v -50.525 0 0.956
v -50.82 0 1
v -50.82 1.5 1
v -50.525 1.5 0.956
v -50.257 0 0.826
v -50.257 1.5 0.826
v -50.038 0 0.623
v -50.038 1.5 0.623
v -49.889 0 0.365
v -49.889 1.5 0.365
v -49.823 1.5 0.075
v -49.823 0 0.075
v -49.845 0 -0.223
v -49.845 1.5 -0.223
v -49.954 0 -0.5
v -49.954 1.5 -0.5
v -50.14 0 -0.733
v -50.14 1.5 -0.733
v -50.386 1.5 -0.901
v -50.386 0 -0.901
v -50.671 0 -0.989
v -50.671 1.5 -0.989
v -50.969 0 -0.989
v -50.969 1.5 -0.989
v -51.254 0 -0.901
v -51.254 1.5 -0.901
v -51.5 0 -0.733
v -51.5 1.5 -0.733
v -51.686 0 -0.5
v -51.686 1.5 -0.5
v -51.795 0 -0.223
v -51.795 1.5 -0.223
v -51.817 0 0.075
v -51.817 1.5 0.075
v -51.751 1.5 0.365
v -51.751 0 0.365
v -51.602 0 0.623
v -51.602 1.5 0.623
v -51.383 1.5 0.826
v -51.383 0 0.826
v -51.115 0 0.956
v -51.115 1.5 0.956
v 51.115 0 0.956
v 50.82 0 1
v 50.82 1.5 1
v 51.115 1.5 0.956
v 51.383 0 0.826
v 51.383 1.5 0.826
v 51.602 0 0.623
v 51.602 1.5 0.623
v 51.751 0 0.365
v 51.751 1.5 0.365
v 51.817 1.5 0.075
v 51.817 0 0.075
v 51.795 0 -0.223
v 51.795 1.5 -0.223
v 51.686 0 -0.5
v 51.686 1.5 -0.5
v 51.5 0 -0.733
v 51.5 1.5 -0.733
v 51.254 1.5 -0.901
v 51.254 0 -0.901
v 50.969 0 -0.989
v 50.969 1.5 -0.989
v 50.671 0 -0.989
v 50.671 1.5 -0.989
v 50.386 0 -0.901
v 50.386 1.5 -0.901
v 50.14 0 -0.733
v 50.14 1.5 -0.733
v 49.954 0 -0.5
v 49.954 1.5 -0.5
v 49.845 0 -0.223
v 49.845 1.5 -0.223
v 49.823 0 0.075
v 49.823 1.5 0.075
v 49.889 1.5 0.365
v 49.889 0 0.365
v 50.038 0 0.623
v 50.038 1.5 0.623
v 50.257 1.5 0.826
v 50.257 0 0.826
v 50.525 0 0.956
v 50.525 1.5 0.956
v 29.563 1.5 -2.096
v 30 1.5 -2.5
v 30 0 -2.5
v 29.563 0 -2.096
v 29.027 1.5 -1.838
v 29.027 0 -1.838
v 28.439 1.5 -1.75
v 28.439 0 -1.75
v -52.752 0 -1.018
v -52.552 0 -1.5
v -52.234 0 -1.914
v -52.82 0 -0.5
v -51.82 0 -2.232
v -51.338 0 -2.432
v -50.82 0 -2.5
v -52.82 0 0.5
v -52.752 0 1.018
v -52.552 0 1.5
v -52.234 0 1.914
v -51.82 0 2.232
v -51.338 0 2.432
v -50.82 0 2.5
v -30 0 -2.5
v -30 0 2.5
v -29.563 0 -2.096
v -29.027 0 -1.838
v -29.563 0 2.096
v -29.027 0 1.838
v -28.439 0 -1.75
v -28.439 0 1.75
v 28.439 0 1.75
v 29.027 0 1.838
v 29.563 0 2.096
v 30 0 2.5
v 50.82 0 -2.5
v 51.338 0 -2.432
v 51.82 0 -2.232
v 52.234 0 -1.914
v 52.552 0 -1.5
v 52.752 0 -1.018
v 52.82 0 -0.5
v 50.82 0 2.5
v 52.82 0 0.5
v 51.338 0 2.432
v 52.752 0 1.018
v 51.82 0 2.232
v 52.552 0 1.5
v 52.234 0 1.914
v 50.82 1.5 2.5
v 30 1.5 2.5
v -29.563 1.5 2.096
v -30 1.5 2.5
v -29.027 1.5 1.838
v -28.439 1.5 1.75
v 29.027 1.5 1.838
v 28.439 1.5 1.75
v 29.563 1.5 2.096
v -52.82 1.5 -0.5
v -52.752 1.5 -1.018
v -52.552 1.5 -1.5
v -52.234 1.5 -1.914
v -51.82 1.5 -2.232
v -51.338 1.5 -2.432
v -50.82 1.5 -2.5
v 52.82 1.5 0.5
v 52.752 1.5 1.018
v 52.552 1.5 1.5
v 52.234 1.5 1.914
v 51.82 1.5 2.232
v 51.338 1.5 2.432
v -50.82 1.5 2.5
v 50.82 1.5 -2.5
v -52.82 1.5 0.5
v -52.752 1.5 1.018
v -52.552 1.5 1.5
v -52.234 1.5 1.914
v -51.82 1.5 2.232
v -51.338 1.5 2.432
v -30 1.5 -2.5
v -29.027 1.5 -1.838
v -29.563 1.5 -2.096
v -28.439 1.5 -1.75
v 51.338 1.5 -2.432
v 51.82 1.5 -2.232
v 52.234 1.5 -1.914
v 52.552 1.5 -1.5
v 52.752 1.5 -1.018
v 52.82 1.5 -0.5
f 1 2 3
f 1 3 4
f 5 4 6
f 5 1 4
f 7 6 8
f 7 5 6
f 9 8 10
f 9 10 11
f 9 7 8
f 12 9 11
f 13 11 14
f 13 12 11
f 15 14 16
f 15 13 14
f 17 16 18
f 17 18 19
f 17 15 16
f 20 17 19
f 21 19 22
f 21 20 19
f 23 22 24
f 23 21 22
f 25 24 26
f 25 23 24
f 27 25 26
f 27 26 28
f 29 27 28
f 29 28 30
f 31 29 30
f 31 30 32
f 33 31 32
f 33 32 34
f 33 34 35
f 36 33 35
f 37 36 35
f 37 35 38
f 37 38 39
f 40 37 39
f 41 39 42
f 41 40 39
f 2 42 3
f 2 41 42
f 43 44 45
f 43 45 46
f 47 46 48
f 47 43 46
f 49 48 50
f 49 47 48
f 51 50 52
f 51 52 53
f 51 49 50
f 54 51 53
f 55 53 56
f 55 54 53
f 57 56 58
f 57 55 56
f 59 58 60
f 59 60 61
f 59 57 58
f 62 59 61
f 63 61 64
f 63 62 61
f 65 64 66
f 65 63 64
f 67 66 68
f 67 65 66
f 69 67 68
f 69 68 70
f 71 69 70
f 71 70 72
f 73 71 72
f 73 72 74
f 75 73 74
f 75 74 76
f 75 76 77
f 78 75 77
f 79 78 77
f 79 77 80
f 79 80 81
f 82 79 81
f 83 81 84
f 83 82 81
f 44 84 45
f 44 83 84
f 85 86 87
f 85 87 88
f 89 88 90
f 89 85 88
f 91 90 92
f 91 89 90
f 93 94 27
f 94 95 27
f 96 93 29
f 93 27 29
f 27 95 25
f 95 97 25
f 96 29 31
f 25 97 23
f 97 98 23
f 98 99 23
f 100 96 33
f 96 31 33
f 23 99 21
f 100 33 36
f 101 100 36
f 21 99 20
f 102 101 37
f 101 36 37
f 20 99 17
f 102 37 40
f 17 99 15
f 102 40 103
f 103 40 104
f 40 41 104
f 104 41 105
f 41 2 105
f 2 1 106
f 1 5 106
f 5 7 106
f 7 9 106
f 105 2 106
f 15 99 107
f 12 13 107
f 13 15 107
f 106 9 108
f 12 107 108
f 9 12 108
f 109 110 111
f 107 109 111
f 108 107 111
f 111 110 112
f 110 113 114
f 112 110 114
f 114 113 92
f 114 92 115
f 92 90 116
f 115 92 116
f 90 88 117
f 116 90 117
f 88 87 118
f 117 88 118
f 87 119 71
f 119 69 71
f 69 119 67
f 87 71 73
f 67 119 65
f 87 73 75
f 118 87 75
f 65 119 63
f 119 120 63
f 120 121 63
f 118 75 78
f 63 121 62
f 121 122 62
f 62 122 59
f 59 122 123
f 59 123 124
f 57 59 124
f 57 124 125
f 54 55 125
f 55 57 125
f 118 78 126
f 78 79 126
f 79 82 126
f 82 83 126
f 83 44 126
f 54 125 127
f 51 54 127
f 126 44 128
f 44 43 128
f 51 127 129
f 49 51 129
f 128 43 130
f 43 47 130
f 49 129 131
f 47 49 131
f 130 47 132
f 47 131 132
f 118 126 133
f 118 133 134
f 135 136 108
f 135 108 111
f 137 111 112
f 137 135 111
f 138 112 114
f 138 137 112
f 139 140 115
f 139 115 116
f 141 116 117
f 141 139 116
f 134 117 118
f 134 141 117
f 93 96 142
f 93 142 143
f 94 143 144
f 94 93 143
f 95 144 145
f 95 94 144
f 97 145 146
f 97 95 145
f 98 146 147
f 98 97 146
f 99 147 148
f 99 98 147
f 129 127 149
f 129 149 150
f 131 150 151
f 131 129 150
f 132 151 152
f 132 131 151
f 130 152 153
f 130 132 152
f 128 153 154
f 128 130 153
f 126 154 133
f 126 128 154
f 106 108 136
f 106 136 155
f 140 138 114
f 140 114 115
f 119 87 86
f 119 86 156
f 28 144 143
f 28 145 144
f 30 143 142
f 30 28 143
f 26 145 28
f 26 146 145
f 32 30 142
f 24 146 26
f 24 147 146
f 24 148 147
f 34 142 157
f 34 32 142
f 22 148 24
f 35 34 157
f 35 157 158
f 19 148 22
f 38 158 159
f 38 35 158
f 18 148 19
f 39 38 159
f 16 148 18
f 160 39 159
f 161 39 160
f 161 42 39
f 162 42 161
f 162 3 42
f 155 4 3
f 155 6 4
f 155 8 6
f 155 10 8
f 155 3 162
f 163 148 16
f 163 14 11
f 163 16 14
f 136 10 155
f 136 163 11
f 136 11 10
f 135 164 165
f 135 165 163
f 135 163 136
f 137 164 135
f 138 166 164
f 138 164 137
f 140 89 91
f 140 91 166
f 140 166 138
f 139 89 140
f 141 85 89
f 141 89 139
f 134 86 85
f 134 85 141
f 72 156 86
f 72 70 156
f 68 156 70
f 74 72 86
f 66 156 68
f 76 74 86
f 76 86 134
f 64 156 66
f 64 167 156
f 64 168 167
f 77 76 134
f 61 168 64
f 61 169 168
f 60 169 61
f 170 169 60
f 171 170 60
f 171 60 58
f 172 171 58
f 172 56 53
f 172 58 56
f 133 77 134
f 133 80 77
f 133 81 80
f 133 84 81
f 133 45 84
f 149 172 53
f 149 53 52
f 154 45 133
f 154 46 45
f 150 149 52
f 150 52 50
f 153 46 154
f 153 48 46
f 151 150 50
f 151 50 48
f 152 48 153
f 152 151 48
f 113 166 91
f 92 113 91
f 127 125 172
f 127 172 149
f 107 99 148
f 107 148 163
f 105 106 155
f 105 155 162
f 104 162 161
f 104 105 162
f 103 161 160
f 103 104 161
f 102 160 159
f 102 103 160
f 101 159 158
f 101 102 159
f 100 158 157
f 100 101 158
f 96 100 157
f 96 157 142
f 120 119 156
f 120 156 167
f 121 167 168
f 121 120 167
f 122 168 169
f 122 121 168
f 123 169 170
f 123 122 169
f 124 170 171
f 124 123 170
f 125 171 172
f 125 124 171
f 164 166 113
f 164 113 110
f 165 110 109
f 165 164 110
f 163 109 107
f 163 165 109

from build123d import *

# Parameters (mm, degrees)
SKETCH2_R           = 1
BOSS_EXTRUDE1_DEPTH = 1.5
SKETCH3_W           = 60
SKETCH3_H           = 1.5
CUT_EXTRUDE1_DEPTH  = 53.900400755
FILLET1_R           = 2


with BuildPart() as part:
    # Sketch2 → Boss-Extrude1 (new body)
    with BuildSketch(Plane(origin=(0, 0, 0), x_dir=(1, 0, 0), z_dir=(0, 1, 0))):
        with BuildLine():
            Line((-50.82, 2.5), (50.82, 2.5))
            ThreePointArc((50.82, 2.5), (52.234213562, 1.914213562), (52.82, 0.5))
            Line((52.82, 0.5), (52.82, -0.5))
            ThreePointArc((52.82, -0.5), (52.234213562, -1.914213562), (50.82, -2.5))
            Line((50.82, -2.5), (-50.82, -2.5))
            ThreePointArc((-50.82, -2.5), (-52.234213562, -1.914213562), (-52.82, -0.5))
            Line((-52.82, -0.5), (-52.82, 0.5))
            ThreePointArc((-52.82, 0.5), (-52.234213562, 1.914213562), (-50.82, 2.5))
        make_face()
        with Locations(Location((-50.82, 0, 0), (0, 0, 270))):
            Circle(SKETCH2_R, mode=Mode.SUBTRACT)
        with Locations(Location((50.82, 0, 0), (0, 0, 270))):
            Circle(SKETCH2_R, mode=Mode.SUBTRACT)
    extrude(amount=BOSS_EXTRUDE1_DEPTH)

    # Sketch3 → Cut-Extrude1 (cut, through all)
    with BuildSketch(Plane(origin=(0, 1.5, 0), x_dir=(1, 0, 0), z_dir=(0, 1, 0))):
        with Locations((0, 2.5)):
            Rectangle(SKETCH3_W, SKETCH3_H)
        with Locations((0, -2.5)):
            Rectangle(SKETCH3_W, SKETCH3_H)
    extrude(amount=-CUT_EXTRUDE1_DEPTH, mode=Mode.SUBTRACT)

    # Fillet1
    # the kernel refuses this fillet: 2 mm, written as the material it adds along each edge
    with BuildSketch(Plane(origin=(30, 1.5, -1.75), x_dir=(0, 0, -1), z_dir=(0, -1, 0)), Plane(origin=(-30, 1.5, 1.75), x_dir=(0, 0, 1), z_dir=(0, -1, 0))) as fillet1_piece_1:
        with BuildLine():
            CenterArc((2, -1.5612495), FILLET1_R, 128.682187453, 51.317812547)
            Line((0, -1.5612495), (-0.04, -1.5612495))
            Line((-0.04, -1.5612495), (-0.04, 0))
            Line((-0.04, 0), (0, 0.04))
            ThreePointArc((0, 0.04), (0.375, 0.04), (0.725, 0.03122499))
            Line((0.725, 0.03122499), (0.75, 0))
        make_face()
    extrude(amount=1.5)
    with BuildSketch(Plane(origin=(30, 1.5, 1.75), x_dir=(-1, 0, 0), z_dir=(0, -1, 0))) as fillet1_piece_2:
        with BuildLine():
            CenterArc((1.5612495, -2), FILLET1_R, 90, 51.317812547)
            Line((0, -0.75), (-0.03122499, -0.725))
            ThreePointArc((-0.03122499, -0.725), (-0.04, -0.375), (-0.04, 0))
            Line((-0.04, 0), (0, 0.04))
            Line((0, 0.04), (1.5612495, 0.04))
            Line((1.5612495, 0.04), (1.5612495, 0))
        make_face()
    extrude(amount=1.5)
    with BuildSketch(Plane(origin=(-30, 1.5, -1.75), x_dir=(0, 0, -1), z_dir=(0, -1, 0))) as fillet1_piece_3:
        with BuildLine():
            CenterArc((2, 1.5612495), FILLET1_R, 180, 51.317812547)
            Line((0, 1.5612495), (-0.04, 1.5612495))
            Line((-0.04, 1.5612495), (-0.04, 0))
            Line((-0.04, 0), (0, -0.04))
            ThreePointArc((0, -0.04), (0.375, -0.04), (0.725, -0.03122499))
            Line((0.725, -0.03122499), (0.75, 0))
        make_face()
    extrude(amount=1.5)


solid = part.part
